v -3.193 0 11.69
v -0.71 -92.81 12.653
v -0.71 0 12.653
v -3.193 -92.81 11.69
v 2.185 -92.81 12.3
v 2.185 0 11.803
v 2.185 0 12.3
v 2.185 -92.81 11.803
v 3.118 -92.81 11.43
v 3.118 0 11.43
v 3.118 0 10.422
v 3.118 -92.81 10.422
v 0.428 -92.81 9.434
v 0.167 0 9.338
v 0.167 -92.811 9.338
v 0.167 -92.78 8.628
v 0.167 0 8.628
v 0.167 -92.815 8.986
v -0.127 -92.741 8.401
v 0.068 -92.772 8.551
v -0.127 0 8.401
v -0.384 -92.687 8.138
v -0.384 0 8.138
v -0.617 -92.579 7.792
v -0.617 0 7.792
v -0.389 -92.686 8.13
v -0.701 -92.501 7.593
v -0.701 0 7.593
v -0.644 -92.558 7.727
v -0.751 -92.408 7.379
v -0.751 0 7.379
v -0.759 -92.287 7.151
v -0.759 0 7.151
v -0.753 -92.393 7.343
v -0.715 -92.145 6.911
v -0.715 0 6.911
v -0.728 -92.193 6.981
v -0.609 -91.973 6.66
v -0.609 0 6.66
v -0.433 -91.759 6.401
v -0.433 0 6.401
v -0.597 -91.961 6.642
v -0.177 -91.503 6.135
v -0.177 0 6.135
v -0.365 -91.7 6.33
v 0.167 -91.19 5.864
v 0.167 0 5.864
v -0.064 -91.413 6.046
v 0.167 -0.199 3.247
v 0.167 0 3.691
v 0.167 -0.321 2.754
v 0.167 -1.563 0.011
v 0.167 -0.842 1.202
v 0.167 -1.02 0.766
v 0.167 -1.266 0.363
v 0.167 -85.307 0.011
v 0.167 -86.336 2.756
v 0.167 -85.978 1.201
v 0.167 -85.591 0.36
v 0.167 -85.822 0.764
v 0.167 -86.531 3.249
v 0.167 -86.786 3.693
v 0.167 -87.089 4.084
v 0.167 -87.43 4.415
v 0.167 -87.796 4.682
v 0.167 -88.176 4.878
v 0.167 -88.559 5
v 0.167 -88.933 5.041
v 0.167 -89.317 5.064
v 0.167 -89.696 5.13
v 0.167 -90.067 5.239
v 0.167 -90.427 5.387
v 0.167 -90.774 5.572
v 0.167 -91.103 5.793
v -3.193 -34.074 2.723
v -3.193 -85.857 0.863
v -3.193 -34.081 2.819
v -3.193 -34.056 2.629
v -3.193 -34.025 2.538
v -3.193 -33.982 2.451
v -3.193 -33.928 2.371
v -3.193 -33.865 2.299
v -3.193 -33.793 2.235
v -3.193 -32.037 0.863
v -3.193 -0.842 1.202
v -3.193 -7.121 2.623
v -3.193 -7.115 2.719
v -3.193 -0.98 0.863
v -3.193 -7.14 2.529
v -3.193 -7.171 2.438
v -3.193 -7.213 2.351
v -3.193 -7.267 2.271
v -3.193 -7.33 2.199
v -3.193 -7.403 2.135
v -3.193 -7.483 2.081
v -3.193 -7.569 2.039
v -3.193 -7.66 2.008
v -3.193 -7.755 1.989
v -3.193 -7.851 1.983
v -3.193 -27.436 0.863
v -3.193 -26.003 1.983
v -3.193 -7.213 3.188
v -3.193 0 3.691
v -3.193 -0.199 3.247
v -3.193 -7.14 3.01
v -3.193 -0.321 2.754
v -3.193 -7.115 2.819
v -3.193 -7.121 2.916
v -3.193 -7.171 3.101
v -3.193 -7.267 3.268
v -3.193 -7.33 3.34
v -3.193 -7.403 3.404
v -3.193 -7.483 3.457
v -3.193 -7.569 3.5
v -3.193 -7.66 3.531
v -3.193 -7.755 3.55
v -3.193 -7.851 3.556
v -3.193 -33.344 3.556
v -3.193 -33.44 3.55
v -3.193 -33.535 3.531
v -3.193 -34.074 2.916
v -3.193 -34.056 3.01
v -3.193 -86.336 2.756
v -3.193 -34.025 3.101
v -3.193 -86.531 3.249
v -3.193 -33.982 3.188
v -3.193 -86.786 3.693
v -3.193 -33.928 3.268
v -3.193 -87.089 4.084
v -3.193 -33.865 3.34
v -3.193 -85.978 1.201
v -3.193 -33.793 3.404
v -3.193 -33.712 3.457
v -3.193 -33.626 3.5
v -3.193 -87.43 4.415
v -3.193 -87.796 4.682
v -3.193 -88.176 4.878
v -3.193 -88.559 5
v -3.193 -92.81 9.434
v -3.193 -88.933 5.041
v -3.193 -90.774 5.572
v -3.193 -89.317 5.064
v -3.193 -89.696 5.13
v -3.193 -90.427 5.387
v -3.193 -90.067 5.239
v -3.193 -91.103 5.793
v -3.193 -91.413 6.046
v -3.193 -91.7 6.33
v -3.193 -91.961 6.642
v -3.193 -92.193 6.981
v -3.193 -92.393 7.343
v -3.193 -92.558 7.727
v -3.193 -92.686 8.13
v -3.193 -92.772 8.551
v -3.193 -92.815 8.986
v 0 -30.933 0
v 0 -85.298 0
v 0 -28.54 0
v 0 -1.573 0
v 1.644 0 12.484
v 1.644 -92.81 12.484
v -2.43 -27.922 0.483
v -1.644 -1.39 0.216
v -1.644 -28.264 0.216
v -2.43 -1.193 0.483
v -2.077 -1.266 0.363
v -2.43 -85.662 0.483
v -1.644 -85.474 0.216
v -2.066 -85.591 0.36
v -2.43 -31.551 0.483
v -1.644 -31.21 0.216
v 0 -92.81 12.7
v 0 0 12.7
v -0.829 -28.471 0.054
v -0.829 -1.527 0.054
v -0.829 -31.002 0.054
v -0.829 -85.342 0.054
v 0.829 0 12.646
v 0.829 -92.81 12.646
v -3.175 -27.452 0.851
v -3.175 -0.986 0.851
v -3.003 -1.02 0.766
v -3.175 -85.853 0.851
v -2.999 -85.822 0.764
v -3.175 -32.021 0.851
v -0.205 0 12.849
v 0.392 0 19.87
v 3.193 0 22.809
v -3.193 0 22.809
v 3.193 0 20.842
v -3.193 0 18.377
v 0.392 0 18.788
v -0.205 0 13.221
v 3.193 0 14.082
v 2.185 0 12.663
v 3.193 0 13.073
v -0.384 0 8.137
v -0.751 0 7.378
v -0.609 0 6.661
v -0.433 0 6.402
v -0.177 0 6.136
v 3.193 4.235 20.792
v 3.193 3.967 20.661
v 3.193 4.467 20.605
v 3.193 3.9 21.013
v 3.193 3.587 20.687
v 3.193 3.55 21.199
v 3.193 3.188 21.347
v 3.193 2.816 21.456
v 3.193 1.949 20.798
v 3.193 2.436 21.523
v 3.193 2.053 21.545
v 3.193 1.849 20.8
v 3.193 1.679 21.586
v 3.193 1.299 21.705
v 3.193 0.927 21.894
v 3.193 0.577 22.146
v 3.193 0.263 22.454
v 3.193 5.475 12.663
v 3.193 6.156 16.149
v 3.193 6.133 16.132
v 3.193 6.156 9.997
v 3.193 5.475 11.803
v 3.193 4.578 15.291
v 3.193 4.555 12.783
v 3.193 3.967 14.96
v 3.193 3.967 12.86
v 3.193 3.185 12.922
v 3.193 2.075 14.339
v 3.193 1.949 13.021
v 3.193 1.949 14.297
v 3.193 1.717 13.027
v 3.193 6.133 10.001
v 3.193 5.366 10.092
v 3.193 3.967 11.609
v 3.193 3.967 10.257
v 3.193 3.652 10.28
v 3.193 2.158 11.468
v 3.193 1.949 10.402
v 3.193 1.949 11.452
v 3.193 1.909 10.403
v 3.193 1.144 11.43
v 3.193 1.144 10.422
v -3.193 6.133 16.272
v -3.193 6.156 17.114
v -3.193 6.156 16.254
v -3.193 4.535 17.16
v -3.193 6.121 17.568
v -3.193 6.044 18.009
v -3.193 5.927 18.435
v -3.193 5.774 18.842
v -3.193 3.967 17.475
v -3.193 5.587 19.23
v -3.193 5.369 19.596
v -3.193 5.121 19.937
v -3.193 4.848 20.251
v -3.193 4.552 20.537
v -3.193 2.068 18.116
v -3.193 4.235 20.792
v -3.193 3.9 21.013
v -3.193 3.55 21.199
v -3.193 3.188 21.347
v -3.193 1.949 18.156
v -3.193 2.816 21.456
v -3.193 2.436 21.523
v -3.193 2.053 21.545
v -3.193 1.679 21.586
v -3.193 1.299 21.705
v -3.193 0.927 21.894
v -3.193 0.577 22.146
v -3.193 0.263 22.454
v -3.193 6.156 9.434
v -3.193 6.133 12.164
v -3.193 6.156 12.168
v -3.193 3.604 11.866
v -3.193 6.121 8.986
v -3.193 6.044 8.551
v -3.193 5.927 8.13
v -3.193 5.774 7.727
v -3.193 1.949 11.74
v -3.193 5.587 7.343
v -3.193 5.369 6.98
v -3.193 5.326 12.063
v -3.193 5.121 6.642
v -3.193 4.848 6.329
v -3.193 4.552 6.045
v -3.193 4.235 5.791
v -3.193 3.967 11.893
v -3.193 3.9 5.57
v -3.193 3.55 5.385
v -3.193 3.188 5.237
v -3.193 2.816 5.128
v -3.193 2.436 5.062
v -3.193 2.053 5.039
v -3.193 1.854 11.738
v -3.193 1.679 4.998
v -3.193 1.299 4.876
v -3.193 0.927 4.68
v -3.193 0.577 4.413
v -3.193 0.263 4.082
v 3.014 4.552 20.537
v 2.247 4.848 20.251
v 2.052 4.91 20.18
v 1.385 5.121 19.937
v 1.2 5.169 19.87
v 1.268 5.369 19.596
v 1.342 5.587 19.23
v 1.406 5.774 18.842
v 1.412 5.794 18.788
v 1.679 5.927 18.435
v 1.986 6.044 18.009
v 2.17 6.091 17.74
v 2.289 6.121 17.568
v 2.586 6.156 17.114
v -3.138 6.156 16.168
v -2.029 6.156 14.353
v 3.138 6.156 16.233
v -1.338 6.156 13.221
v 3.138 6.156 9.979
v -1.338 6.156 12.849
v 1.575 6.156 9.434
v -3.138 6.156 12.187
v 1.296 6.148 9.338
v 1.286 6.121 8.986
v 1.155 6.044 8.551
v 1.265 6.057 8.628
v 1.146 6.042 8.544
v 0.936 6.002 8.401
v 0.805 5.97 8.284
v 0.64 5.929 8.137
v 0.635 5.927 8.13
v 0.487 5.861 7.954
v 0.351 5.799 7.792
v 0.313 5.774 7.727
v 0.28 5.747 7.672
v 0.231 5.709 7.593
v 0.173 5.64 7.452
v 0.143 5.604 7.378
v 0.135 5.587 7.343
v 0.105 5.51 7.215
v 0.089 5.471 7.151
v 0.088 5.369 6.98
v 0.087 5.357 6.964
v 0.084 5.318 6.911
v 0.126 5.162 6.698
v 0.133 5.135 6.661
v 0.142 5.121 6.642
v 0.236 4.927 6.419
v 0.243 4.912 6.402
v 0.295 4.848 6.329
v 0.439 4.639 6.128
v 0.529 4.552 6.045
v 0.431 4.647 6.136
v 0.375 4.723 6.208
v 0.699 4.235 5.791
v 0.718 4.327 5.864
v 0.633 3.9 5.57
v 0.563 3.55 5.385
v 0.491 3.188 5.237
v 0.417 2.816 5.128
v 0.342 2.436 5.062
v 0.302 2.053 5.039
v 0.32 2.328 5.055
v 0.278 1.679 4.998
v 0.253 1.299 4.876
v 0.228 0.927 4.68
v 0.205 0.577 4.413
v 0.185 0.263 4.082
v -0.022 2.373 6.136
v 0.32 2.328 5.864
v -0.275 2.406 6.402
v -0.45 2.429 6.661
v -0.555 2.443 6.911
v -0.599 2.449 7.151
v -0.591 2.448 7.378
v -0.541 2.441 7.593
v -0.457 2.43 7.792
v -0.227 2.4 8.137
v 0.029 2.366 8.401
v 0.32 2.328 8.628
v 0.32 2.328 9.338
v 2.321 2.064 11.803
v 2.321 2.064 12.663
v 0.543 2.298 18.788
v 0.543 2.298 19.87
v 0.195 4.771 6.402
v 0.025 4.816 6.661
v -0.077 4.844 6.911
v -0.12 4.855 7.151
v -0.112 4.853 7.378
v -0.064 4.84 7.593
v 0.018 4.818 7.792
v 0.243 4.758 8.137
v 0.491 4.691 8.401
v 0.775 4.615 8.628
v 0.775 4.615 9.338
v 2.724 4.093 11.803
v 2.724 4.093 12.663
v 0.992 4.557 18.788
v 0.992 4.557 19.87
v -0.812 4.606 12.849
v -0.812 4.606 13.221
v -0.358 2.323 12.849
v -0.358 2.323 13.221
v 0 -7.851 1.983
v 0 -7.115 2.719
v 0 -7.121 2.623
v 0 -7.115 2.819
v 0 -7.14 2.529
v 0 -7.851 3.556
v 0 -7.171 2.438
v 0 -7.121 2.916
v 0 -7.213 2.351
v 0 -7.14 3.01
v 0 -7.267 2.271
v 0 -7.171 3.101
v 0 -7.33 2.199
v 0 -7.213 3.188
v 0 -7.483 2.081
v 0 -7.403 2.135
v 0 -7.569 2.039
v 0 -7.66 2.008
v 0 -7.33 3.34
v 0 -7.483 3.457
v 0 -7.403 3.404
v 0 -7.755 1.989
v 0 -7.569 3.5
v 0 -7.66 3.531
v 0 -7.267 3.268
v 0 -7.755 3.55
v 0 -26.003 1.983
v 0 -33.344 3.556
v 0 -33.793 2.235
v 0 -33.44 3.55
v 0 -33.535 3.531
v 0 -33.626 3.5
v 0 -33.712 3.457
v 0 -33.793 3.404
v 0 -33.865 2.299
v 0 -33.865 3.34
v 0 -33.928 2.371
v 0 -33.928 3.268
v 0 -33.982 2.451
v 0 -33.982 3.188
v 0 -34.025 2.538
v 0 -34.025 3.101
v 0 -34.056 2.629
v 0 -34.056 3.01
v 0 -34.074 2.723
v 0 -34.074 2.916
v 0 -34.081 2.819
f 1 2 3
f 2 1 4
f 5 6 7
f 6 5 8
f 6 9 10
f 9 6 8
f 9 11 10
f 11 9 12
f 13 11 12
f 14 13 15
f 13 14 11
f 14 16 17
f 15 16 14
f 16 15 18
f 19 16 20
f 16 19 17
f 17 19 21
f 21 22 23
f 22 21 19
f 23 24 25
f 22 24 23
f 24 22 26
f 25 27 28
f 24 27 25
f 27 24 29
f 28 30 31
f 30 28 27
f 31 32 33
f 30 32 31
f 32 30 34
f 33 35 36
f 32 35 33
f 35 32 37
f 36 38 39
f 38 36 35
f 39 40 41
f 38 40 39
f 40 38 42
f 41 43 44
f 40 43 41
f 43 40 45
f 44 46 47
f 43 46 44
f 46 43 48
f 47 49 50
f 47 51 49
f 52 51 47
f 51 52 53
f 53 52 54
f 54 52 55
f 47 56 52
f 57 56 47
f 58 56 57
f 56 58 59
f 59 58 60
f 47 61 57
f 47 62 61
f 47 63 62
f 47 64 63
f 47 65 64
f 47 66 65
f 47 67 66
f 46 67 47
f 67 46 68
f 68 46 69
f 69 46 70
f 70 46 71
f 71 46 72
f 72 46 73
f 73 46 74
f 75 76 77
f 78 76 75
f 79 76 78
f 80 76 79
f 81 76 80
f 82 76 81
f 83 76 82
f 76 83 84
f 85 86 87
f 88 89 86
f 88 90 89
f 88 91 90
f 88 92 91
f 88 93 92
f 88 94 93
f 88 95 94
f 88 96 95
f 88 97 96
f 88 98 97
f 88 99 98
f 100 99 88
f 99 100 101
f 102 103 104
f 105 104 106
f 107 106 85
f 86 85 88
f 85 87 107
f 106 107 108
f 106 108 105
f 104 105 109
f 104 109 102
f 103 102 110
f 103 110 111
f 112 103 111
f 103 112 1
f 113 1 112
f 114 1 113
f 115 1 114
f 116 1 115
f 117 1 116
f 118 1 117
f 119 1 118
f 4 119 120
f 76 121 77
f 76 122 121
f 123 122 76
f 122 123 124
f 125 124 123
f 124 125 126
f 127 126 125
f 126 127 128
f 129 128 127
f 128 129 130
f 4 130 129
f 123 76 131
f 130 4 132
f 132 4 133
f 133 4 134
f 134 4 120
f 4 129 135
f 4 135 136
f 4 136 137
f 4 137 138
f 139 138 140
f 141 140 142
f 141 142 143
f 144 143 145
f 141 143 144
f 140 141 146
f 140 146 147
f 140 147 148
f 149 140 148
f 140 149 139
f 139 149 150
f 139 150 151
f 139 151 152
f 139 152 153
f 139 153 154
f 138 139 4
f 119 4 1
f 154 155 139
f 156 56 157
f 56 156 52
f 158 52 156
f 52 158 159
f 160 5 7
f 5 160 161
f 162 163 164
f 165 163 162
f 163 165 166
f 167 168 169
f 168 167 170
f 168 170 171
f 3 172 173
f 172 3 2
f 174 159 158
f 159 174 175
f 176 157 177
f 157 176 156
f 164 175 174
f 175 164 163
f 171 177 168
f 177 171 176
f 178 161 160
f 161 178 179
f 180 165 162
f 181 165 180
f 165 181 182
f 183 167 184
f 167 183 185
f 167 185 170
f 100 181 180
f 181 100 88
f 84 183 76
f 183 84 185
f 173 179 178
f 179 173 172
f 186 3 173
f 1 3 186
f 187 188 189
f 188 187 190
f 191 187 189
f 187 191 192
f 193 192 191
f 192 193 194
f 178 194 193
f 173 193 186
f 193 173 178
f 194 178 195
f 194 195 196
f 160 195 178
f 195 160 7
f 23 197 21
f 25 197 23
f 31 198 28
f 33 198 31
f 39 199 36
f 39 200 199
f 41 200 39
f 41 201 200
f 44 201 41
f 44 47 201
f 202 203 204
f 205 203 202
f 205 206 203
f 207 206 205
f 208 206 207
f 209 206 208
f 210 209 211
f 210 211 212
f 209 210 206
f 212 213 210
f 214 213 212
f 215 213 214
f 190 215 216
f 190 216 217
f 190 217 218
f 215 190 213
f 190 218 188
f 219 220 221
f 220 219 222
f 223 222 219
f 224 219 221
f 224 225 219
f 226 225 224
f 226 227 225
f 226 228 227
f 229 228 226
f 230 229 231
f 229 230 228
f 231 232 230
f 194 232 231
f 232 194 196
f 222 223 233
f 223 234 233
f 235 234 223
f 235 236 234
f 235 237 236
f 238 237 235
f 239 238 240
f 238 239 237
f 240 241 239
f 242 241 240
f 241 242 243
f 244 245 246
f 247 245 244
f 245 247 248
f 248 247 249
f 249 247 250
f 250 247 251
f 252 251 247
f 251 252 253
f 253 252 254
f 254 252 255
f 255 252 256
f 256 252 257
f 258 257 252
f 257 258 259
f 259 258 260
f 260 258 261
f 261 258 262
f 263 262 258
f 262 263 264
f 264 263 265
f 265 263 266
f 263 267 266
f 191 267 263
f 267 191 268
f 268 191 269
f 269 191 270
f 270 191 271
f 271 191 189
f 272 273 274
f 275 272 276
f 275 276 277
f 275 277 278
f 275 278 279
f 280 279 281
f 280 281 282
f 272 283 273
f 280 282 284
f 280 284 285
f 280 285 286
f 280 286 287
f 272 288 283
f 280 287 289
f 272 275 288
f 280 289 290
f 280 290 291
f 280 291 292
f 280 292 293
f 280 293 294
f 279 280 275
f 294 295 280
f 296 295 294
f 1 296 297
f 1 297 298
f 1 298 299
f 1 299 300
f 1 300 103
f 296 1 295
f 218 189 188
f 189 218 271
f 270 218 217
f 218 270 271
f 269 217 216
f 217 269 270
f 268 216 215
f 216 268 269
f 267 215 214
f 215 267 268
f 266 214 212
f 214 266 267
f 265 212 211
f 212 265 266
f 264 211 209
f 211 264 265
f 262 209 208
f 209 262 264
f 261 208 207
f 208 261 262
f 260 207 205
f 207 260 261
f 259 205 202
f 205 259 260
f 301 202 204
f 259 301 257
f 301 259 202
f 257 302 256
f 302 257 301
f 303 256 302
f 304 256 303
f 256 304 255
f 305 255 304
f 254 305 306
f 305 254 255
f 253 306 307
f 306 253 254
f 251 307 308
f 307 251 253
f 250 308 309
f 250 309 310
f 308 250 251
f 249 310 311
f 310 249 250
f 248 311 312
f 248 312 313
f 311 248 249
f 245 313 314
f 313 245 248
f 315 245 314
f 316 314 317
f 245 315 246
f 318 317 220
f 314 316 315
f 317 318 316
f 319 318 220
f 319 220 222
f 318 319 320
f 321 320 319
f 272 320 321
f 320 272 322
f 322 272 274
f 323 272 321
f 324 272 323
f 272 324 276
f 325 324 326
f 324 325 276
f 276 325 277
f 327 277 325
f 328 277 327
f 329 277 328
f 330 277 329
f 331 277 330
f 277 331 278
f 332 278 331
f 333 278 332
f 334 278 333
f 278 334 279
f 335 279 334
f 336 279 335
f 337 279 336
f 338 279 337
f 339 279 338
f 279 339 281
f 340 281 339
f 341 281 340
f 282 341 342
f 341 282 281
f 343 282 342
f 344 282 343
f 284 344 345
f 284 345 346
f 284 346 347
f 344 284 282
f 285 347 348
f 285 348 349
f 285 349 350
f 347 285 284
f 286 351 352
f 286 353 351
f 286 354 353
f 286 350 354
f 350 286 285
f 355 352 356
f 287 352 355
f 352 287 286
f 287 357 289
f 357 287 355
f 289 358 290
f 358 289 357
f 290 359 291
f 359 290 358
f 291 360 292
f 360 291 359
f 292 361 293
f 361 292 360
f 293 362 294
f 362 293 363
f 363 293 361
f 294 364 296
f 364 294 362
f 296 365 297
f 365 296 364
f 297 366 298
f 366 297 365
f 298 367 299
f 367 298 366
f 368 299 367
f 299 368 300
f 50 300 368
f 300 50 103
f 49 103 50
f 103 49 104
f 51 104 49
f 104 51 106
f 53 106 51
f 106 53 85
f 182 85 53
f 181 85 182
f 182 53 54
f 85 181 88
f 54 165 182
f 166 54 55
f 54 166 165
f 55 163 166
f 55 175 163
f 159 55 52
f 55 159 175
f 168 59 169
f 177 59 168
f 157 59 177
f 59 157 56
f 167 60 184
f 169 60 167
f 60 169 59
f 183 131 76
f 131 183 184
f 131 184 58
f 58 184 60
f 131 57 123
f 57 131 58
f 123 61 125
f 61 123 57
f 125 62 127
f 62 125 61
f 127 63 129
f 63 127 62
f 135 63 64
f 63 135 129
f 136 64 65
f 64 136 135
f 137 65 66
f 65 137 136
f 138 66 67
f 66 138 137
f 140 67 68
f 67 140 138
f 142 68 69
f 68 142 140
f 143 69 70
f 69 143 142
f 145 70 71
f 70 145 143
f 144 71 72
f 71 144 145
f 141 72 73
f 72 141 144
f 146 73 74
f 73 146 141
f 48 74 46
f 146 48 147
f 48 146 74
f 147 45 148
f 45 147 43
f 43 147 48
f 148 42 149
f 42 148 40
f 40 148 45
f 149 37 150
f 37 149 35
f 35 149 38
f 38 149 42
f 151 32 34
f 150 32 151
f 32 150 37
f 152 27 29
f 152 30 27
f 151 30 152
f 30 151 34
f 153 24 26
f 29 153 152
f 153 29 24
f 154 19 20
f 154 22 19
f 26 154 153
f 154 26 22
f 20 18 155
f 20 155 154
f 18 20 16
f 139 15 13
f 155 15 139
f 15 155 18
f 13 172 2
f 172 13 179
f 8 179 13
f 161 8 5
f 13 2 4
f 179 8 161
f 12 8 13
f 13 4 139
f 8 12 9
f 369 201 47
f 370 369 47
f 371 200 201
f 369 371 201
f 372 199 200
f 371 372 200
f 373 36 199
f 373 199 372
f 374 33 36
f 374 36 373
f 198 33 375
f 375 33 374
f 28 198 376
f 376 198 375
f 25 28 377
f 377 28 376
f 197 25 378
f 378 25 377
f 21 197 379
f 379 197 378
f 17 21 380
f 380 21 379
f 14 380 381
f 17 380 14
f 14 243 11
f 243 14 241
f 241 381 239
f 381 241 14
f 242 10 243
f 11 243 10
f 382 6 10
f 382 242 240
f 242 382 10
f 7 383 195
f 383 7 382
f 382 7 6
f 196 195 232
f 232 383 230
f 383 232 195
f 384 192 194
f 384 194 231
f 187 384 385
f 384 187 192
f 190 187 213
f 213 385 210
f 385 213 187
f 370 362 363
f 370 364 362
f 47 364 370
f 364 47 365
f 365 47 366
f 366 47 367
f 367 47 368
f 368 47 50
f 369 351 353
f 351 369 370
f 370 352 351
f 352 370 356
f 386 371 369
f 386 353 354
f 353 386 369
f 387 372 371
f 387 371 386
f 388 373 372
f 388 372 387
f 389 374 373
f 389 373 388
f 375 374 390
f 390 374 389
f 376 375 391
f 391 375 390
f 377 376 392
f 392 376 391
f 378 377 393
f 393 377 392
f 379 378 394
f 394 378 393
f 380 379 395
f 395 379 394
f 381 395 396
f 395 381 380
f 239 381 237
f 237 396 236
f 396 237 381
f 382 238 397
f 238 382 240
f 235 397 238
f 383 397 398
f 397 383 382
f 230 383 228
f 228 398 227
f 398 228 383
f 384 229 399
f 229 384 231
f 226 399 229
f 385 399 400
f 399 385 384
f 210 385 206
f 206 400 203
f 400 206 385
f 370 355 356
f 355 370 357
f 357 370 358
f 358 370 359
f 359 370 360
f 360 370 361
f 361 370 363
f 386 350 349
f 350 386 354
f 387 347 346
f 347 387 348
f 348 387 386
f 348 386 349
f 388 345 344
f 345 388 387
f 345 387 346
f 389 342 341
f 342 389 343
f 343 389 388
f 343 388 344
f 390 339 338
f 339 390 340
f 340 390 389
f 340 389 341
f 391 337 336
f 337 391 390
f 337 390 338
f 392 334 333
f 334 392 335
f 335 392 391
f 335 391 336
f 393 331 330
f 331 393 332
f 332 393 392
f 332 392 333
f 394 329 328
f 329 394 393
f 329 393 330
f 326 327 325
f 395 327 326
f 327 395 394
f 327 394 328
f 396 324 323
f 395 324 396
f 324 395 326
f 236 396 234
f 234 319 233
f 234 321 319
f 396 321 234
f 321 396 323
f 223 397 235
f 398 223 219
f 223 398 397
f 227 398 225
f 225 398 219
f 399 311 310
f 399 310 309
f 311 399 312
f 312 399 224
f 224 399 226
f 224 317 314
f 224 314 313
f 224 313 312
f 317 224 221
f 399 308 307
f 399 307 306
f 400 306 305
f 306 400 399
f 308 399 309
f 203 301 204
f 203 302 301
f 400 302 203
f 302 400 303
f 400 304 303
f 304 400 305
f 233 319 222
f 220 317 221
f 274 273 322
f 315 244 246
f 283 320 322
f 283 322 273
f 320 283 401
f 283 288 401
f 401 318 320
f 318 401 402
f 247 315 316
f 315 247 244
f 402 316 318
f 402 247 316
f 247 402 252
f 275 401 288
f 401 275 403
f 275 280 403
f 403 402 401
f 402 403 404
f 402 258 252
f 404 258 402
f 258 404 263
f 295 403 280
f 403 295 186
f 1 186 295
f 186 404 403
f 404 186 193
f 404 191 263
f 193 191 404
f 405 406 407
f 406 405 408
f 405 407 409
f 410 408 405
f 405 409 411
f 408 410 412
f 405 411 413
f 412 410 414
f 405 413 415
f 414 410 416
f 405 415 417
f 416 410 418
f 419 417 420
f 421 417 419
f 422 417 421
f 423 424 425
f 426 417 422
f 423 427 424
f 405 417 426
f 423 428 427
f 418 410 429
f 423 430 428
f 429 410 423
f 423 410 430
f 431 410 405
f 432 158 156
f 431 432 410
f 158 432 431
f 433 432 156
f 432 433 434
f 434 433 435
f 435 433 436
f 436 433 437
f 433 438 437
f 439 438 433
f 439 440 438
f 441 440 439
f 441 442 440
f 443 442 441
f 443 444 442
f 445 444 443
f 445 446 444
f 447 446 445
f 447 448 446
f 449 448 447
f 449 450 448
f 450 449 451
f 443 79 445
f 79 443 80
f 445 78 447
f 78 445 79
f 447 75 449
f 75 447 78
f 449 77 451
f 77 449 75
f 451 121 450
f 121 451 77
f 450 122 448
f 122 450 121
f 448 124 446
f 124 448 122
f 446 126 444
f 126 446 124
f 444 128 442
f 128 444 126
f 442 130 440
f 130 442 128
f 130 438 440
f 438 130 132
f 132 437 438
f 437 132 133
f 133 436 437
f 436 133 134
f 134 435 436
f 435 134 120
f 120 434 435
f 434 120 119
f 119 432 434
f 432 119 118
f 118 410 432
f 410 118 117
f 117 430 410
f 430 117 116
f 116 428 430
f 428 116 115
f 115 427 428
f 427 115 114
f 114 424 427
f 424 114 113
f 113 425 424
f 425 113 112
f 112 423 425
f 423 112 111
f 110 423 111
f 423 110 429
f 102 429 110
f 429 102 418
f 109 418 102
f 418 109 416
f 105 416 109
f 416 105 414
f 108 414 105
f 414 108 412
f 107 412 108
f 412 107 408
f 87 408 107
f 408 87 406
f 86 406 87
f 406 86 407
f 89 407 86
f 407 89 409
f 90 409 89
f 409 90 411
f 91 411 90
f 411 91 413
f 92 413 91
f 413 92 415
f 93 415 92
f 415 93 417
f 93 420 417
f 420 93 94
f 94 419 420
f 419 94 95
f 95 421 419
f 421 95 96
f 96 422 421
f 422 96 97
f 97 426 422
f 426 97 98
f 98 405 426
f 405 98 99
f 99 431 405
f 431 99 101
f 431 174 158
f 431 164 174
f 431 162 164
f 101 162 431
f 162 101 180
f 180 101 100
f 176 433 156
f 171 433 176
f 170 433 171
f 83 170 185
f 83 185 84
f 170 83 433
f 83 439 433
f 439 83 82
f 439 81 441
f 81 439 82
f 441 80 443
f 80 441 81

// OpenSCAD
// file: keygen.scad
$inf=1000;
$eps=.001;

function key_move(points, offset) = [
    for(p=points) [p[0] + offset[0],
                   p[1] + offset[1]]
];

module key_outline(outline_points, thickness, outline_paths=undef) {
    rotate(-90, [0, 1, 0]) rotate(-90, [0, 0, 1]) // Rotate into the correct plane
        linear_extrude(height=thickness, center=true) // Extrude the key outline
            polygon(points=outline_points, paths=outline_paths); // Draw the outline
}

module key_blade(warding, plug_diameter=0) {
    // Draw the blade to infinity in Y
    // optionally intersected with the plug cylinder
    // to round the bottom
    intersection() {
        rotate(180, [0, 0, 1]) rotate(90, [1, 0, 0])
            linear_extrude(height=2*$inf, center=true)
                polygon(warding);

        // Draw the plug, if a plug diameter is specified
        if(plug_diameter > 0) {
            // Draw infinite cylinder in -Y
            translate([0, 0, 0.5*plug_diameter]) rotate(90, [1, 0, 0])
                cylinder(r=0.5*plug_diameter, h=$inf, center=true, $fn=$fn ? 4*$fn : 48);
        }
    }
}

module key_x_line(length) {
    // Hack to draw something close to a line in X
    // since OpenSCAD does not support line primitives
    square([length, $eps], center=true);
}

module key_warding_cutter(warding, blade_height, cutter_radius, left) {
    neg = left ? -1 : 1;
    translate([neg * cutter_radius, 0, 0])
        rotate_extrude($fn=$fn ? 4*$fn : 48)
            translate([neg * cutter_radius, 0])
                difference() {
                    translate([0, 0.5*blade_height])
                        square([2 * cutter_radius, blade_height], center=true);
                    minkowski() {
                        translate([neg * 1.5 * cutter_radius, 0])
                            key_x_line(3 * cutter_radius);
                        polygon(warding);
                    }
                    polygon(warding);
                }
}

module key_engrave(engrave_points, engrave_depth, left, thickness, engrave_paths=undef) {
    translate([(left ? -1 : 1) * 0.5*thickness, 0, 0]) rotate(-90, [0, 1, 0]) rotate(-90, [0, 0, 1]) // Translate and rotate into the correct soot
        linear_extrude(height=2*engrave_depth, center=true) // Extrude the key outline
            polygon(points=engrave_points, paths=engrave_paths); // Draw the outline
}

module key_blank(outline_points,
                warding,
                outline_paths=undef,
                engrave_right_points=[],
                engrave_right_paths=undef,
                engrave_left_points=[],
                engrave_left_paths=undef,
                bow_thickness=0,
                engrave_depth=.1,
                plug_diameter=0,
                offset=[0, 0],
                cutter_radius=18,
                milling_offset=0) {

    // Find the bounding box of the warding
    warding_min = [min([for(e=warding) e[0]]), min([for(e=warding) e[1]])];
    warding_max = [max([for(e=warding) e[0]]), max([for(e=warding) e[1]])];

    // Apply the given offset to the outline,
    // holes, and engrave
    outline_adj = key_move(outline_points, offset);
    engrave_left_adj = key_move(engrave_left_points, offset);
    engrave_right_adj = key_move(engrave_right_points, offset);

    // Move the warding profile
    // so that it is centered in X
    // and non-negative in Y
    warding_offset = [-0.5 * (warding_min[0] + warding_max[0]),
                      -warding_min[1]];
    warding_adj = key_move(warding, warding_offset);

    // Infer various key properties
    thickness = (bow_thickness == 0) ? abs(warding_max[0] - warding_min[0]) : bow_thickness;
    blade_height = abs(warding_max[1] - warding_min[1]);

    // Cut out the warding milling artifacts
    // from the bow
    difference() {
        // Create the bulk of the keyblank
        // by intersecting the outline
        // with the warding profile
        // and the plug
        intersection() {
            // Draw the key outline and holes
            key_outline(outline_adj, thickness, outline_paths);
            
            // Draw the blade, and a giant box where the bow is
            // so that we don't wipe out the bow
            // when the intersection happens
            union() {
                // Fill +Y half-space
                translate([0, $inf/2+milling_offset, 0])
                    cube([$inf, $inf, $inf], center=true);

                key_blade(warding_adj, plug_diameter);
            }
        }
        // Draw the milling wheels that cut the warding
        if(cutter_radius != 0) {
            translate([0, milling_offset, 0])
                union() {
                    key_warding_cutter(warding_adj, blade_height, cutter_radius, false);
                    key_warding_cutter(warding_adj, blade_height, cutter_radius, true);
                }
        }

        // Draw the engraveing
        key_engrave(engrave_right_adj, engrave_depth, false, thickness, engrave_right_paths);
        key_engrave(engrave_left_adj, engrave_depth, true, thickness, engrave_left_paths);
    }
}

function key_code_to_heights(code, depth_table) = [for(i=key_enum(code)) depth_table[search(code[i], "0123456789")[0]]];

module key_bitting_cutter(flat, angle, tool_height) {
    polygon([[-0.5 * flat, 0],
            [0.5 * flat, 0],
            [0.5 * flat + tan(0.5 * angle) * tool_height, tool_height],
            [-0.5 * flat - tan(0.5 * angle) * tool_height, tool_height]]);
}

module key_bitting(heights,
                   locations,
                   flat,
                   angle=100,
                   cutter_width=5,
                   cutter_height=5,
                   angles=[]) {
    // Rotate the cutting tool to the proper orientation
    rotate(-90, [0, 0, 1]) rotate(90, [1, 0, 0])
        // Union together a handful of trapezoids
        // that comprise the cuts
        union() {
            for(i=key_enum(heights)) {
                // Move to the proper location and height, and maybe rotate
                translate([locations[i], heights[i]]) rotate(i >= len(angles) ? 0 : angles[i], [0, 1, 0])
                    linear_extrude(height=cutter_width, center=true)
                        key_bitting_cutter(flat, angle, cutter_height);
            }
        }
}

function key_lkup(ks, vs, k) = vs[search([k], [for(ki=ks) [ki]])[0]];
    
function key_enum(l) = len(l) > 0 ? [for(i=[0:len(l)-1]) i] : [];

function _strcat(v, i, car, s) = (i==s ? v[i] : str(_strcat(v, i-1, car, s), str(car,v[i]) )); // from https://www.thingiverse.com/thing:202724

function _strslice(l, start, stop) =
        stop > start
        ? _strcat([for(i=[start:stop]) l[i]], stop-start, "", 0)
        : "";

function key_split_on_dash(s) = [
    for(i=[0:len(search("-", s, 0)[0])])
        _strslice(s, search("-", str("-", s), 0)[0][i], search("-", str(s, "-"), 0)[0][i]-1)
];
// main file
use <keygen.scad>
include <schlage.gen.scad>

module side_bit_milling(cut_locations, bitting="") {
    sbm_cut_locations = [for(i=[0:len(cut_locations)-2]) 0.5 * (cut_locations[i] + cut_locations[i+1])];
    
    sbm_offsets_mil = [[], [-32, 48], [-32, 24], [0, 60], [0, 36], [32, 48], [32, 24]];
    sbm_offsets = [for(p=sbm_offsets_mil) [for(e=p) e * 0.0254]];
    sbm_angle = 120;
    sbm_max_height = 140 * 0.0254;
    sbm_cutter_radius= 29 * 0.0254;
    sbm_dist = 5;
    sbm_eps = 0.1;
    sbm_on_ramp = 29;

    heights = key_code_to_heights(bitting, sbm_offsets);

    rotate(-90, [0, 1, 0]) rotate(-90, [0, 0, 1])
        linear_extrude(height=sbm_dist)
            minkowski() {
                union() {
                    for(i=key_enum(heights)) {
                        translate([sbm_cut_locations[i], 0])
                            polygon([[heights[i][0], heights[i][1] + sbm_cutter_radius],
                                    [tan(0.5 * sbm_angle) * (sbm_max_height-heights[i][1]-2*sbm_cutter_radius), sbm_max_height - sbm_cutter_radius],
                                    [-tan(0.5 * sbm_angle) * (sbm_max_height-heights[i][1]-2*sbm_cutter_radius), sbm_max_height - sbm_cutter_radius]]);
                    }
                    translate([sbm_on_ramp + sbm_cutter_radius, 0])
                        polygon([[0, 0],
                                 [tan(0.5 * sbm_angle) * (sbm_max_height-2*sbm_cutter_radius), sbm_max_height - sbm_cutter_radius],
                                 [-tan(0.5 * sbm_angle) * (sbm_max_height-2*sbm_cutter_radius), sbm_max_height - sbm_cutter_radius]]);
                    polygon([[sbm_cut_locations[0], sbm_max_height - sbm_cutter_radius],
                              [sbm_on_ramp, sbm_max_height - sbm_cutter_radius],
                              [sbm_on_ramp, sbm_max_height - sbm_cutter_radius - sbm_eps],
                              [sbm_cut_locations[0], sbm_max_height - sbm_cutter_radius - sbm_eps]]);
                }
                circle(r=sbm_cutter_radius, center=true, $fn=$fn ? 4*$fn : 48);
            }
}

module schlage_primus(bitting="",
                      outline_name="6-pin",
                      warding_name="CP") {

    name = "Schlage Primus Classic";

    /*
        Bitting is specified from bow to tip, 0-9, with 0 being the shallowest cut and 9 being the deepest.

        Then, side-bit milling is specified from bow to tip, 1-6.

        A dash separates the two.

        Example: 253636-24436
    */

    // TODO is 5-pin primus a thing??

    outlines_k = ["6-pin"];
    outlines_v = [[outline_6pin_points, outline_6pin_paths,
                   [-outline_6pin_points[92][0], -outline_6pin_points[98][1]],
                   engrave_6pin_points,
                   engrave_6pin_paths]];

    // TODO add primus keyways

    wardings_k = ["CP",
                  "CEP",
                  "EP",
                  "EFP",
                  "FP",
                  "FGP",
                  "HP",
                  "JP",
                  "LP"];
    wardings_v = [warding_cp_points,
                  warding_cep_points,
                  warding_ep_points,
                  warding_efp_points,
                  warding_fp_points,
                  warding_fgp_points,
                  warding_hp_points,
                  warding_jp_points,
                  warding_lp_points];

    outline_param = key_lkup(outlines_k, outlines_v, outline_name);
    outline_points = outline_param[0];
    outline_paths = outline_param[1];
    offset = outline_param[2];
    engrave_points = outline_param[3];
    engrave_paths = outline_param[4];

    warding_points = key_lkup(wardings_k, wardings_v, warding_name);
    
    cut_locations = [for(i=[.231, .3872, .5434, .6996, .8558, 1.012]) i*25.4];
    depth_table = [for(i=[0.335:-0.015:0.199]) i*25.4];

    bitting_list = key_split_on_dash(bitting);
    top_bitting = bitting_list[0];
    side_bitting = len(bitting_list) > 1 ? bitting_list[1] : "";

    heights = key_code_to_heights(top_bitting, depth_table);


    difference() {
        if($children == 0) {
            key_blank(outline_points,
                      warding_points,
                      outline_paths=outline_paths,
                      engrave_right_points=engrave_points,
                      engrave_right_paths=engrave_paths,
                      engrave_left_points=engrave_points,
                      engrave_left_paths=engrave_paths,
                      offset=offset,
                      plug_diameter=12.7);
        } else {
            children(0);
        }
        key_bitting(heights, cut_locations, .7874);
        side_bit_milling(cut_locations, side_bitting);
    }
}

// Defaults
bitting="";
outline="6-pin";
warding="CP";
schlage_primus(bitting, outline, warding);
